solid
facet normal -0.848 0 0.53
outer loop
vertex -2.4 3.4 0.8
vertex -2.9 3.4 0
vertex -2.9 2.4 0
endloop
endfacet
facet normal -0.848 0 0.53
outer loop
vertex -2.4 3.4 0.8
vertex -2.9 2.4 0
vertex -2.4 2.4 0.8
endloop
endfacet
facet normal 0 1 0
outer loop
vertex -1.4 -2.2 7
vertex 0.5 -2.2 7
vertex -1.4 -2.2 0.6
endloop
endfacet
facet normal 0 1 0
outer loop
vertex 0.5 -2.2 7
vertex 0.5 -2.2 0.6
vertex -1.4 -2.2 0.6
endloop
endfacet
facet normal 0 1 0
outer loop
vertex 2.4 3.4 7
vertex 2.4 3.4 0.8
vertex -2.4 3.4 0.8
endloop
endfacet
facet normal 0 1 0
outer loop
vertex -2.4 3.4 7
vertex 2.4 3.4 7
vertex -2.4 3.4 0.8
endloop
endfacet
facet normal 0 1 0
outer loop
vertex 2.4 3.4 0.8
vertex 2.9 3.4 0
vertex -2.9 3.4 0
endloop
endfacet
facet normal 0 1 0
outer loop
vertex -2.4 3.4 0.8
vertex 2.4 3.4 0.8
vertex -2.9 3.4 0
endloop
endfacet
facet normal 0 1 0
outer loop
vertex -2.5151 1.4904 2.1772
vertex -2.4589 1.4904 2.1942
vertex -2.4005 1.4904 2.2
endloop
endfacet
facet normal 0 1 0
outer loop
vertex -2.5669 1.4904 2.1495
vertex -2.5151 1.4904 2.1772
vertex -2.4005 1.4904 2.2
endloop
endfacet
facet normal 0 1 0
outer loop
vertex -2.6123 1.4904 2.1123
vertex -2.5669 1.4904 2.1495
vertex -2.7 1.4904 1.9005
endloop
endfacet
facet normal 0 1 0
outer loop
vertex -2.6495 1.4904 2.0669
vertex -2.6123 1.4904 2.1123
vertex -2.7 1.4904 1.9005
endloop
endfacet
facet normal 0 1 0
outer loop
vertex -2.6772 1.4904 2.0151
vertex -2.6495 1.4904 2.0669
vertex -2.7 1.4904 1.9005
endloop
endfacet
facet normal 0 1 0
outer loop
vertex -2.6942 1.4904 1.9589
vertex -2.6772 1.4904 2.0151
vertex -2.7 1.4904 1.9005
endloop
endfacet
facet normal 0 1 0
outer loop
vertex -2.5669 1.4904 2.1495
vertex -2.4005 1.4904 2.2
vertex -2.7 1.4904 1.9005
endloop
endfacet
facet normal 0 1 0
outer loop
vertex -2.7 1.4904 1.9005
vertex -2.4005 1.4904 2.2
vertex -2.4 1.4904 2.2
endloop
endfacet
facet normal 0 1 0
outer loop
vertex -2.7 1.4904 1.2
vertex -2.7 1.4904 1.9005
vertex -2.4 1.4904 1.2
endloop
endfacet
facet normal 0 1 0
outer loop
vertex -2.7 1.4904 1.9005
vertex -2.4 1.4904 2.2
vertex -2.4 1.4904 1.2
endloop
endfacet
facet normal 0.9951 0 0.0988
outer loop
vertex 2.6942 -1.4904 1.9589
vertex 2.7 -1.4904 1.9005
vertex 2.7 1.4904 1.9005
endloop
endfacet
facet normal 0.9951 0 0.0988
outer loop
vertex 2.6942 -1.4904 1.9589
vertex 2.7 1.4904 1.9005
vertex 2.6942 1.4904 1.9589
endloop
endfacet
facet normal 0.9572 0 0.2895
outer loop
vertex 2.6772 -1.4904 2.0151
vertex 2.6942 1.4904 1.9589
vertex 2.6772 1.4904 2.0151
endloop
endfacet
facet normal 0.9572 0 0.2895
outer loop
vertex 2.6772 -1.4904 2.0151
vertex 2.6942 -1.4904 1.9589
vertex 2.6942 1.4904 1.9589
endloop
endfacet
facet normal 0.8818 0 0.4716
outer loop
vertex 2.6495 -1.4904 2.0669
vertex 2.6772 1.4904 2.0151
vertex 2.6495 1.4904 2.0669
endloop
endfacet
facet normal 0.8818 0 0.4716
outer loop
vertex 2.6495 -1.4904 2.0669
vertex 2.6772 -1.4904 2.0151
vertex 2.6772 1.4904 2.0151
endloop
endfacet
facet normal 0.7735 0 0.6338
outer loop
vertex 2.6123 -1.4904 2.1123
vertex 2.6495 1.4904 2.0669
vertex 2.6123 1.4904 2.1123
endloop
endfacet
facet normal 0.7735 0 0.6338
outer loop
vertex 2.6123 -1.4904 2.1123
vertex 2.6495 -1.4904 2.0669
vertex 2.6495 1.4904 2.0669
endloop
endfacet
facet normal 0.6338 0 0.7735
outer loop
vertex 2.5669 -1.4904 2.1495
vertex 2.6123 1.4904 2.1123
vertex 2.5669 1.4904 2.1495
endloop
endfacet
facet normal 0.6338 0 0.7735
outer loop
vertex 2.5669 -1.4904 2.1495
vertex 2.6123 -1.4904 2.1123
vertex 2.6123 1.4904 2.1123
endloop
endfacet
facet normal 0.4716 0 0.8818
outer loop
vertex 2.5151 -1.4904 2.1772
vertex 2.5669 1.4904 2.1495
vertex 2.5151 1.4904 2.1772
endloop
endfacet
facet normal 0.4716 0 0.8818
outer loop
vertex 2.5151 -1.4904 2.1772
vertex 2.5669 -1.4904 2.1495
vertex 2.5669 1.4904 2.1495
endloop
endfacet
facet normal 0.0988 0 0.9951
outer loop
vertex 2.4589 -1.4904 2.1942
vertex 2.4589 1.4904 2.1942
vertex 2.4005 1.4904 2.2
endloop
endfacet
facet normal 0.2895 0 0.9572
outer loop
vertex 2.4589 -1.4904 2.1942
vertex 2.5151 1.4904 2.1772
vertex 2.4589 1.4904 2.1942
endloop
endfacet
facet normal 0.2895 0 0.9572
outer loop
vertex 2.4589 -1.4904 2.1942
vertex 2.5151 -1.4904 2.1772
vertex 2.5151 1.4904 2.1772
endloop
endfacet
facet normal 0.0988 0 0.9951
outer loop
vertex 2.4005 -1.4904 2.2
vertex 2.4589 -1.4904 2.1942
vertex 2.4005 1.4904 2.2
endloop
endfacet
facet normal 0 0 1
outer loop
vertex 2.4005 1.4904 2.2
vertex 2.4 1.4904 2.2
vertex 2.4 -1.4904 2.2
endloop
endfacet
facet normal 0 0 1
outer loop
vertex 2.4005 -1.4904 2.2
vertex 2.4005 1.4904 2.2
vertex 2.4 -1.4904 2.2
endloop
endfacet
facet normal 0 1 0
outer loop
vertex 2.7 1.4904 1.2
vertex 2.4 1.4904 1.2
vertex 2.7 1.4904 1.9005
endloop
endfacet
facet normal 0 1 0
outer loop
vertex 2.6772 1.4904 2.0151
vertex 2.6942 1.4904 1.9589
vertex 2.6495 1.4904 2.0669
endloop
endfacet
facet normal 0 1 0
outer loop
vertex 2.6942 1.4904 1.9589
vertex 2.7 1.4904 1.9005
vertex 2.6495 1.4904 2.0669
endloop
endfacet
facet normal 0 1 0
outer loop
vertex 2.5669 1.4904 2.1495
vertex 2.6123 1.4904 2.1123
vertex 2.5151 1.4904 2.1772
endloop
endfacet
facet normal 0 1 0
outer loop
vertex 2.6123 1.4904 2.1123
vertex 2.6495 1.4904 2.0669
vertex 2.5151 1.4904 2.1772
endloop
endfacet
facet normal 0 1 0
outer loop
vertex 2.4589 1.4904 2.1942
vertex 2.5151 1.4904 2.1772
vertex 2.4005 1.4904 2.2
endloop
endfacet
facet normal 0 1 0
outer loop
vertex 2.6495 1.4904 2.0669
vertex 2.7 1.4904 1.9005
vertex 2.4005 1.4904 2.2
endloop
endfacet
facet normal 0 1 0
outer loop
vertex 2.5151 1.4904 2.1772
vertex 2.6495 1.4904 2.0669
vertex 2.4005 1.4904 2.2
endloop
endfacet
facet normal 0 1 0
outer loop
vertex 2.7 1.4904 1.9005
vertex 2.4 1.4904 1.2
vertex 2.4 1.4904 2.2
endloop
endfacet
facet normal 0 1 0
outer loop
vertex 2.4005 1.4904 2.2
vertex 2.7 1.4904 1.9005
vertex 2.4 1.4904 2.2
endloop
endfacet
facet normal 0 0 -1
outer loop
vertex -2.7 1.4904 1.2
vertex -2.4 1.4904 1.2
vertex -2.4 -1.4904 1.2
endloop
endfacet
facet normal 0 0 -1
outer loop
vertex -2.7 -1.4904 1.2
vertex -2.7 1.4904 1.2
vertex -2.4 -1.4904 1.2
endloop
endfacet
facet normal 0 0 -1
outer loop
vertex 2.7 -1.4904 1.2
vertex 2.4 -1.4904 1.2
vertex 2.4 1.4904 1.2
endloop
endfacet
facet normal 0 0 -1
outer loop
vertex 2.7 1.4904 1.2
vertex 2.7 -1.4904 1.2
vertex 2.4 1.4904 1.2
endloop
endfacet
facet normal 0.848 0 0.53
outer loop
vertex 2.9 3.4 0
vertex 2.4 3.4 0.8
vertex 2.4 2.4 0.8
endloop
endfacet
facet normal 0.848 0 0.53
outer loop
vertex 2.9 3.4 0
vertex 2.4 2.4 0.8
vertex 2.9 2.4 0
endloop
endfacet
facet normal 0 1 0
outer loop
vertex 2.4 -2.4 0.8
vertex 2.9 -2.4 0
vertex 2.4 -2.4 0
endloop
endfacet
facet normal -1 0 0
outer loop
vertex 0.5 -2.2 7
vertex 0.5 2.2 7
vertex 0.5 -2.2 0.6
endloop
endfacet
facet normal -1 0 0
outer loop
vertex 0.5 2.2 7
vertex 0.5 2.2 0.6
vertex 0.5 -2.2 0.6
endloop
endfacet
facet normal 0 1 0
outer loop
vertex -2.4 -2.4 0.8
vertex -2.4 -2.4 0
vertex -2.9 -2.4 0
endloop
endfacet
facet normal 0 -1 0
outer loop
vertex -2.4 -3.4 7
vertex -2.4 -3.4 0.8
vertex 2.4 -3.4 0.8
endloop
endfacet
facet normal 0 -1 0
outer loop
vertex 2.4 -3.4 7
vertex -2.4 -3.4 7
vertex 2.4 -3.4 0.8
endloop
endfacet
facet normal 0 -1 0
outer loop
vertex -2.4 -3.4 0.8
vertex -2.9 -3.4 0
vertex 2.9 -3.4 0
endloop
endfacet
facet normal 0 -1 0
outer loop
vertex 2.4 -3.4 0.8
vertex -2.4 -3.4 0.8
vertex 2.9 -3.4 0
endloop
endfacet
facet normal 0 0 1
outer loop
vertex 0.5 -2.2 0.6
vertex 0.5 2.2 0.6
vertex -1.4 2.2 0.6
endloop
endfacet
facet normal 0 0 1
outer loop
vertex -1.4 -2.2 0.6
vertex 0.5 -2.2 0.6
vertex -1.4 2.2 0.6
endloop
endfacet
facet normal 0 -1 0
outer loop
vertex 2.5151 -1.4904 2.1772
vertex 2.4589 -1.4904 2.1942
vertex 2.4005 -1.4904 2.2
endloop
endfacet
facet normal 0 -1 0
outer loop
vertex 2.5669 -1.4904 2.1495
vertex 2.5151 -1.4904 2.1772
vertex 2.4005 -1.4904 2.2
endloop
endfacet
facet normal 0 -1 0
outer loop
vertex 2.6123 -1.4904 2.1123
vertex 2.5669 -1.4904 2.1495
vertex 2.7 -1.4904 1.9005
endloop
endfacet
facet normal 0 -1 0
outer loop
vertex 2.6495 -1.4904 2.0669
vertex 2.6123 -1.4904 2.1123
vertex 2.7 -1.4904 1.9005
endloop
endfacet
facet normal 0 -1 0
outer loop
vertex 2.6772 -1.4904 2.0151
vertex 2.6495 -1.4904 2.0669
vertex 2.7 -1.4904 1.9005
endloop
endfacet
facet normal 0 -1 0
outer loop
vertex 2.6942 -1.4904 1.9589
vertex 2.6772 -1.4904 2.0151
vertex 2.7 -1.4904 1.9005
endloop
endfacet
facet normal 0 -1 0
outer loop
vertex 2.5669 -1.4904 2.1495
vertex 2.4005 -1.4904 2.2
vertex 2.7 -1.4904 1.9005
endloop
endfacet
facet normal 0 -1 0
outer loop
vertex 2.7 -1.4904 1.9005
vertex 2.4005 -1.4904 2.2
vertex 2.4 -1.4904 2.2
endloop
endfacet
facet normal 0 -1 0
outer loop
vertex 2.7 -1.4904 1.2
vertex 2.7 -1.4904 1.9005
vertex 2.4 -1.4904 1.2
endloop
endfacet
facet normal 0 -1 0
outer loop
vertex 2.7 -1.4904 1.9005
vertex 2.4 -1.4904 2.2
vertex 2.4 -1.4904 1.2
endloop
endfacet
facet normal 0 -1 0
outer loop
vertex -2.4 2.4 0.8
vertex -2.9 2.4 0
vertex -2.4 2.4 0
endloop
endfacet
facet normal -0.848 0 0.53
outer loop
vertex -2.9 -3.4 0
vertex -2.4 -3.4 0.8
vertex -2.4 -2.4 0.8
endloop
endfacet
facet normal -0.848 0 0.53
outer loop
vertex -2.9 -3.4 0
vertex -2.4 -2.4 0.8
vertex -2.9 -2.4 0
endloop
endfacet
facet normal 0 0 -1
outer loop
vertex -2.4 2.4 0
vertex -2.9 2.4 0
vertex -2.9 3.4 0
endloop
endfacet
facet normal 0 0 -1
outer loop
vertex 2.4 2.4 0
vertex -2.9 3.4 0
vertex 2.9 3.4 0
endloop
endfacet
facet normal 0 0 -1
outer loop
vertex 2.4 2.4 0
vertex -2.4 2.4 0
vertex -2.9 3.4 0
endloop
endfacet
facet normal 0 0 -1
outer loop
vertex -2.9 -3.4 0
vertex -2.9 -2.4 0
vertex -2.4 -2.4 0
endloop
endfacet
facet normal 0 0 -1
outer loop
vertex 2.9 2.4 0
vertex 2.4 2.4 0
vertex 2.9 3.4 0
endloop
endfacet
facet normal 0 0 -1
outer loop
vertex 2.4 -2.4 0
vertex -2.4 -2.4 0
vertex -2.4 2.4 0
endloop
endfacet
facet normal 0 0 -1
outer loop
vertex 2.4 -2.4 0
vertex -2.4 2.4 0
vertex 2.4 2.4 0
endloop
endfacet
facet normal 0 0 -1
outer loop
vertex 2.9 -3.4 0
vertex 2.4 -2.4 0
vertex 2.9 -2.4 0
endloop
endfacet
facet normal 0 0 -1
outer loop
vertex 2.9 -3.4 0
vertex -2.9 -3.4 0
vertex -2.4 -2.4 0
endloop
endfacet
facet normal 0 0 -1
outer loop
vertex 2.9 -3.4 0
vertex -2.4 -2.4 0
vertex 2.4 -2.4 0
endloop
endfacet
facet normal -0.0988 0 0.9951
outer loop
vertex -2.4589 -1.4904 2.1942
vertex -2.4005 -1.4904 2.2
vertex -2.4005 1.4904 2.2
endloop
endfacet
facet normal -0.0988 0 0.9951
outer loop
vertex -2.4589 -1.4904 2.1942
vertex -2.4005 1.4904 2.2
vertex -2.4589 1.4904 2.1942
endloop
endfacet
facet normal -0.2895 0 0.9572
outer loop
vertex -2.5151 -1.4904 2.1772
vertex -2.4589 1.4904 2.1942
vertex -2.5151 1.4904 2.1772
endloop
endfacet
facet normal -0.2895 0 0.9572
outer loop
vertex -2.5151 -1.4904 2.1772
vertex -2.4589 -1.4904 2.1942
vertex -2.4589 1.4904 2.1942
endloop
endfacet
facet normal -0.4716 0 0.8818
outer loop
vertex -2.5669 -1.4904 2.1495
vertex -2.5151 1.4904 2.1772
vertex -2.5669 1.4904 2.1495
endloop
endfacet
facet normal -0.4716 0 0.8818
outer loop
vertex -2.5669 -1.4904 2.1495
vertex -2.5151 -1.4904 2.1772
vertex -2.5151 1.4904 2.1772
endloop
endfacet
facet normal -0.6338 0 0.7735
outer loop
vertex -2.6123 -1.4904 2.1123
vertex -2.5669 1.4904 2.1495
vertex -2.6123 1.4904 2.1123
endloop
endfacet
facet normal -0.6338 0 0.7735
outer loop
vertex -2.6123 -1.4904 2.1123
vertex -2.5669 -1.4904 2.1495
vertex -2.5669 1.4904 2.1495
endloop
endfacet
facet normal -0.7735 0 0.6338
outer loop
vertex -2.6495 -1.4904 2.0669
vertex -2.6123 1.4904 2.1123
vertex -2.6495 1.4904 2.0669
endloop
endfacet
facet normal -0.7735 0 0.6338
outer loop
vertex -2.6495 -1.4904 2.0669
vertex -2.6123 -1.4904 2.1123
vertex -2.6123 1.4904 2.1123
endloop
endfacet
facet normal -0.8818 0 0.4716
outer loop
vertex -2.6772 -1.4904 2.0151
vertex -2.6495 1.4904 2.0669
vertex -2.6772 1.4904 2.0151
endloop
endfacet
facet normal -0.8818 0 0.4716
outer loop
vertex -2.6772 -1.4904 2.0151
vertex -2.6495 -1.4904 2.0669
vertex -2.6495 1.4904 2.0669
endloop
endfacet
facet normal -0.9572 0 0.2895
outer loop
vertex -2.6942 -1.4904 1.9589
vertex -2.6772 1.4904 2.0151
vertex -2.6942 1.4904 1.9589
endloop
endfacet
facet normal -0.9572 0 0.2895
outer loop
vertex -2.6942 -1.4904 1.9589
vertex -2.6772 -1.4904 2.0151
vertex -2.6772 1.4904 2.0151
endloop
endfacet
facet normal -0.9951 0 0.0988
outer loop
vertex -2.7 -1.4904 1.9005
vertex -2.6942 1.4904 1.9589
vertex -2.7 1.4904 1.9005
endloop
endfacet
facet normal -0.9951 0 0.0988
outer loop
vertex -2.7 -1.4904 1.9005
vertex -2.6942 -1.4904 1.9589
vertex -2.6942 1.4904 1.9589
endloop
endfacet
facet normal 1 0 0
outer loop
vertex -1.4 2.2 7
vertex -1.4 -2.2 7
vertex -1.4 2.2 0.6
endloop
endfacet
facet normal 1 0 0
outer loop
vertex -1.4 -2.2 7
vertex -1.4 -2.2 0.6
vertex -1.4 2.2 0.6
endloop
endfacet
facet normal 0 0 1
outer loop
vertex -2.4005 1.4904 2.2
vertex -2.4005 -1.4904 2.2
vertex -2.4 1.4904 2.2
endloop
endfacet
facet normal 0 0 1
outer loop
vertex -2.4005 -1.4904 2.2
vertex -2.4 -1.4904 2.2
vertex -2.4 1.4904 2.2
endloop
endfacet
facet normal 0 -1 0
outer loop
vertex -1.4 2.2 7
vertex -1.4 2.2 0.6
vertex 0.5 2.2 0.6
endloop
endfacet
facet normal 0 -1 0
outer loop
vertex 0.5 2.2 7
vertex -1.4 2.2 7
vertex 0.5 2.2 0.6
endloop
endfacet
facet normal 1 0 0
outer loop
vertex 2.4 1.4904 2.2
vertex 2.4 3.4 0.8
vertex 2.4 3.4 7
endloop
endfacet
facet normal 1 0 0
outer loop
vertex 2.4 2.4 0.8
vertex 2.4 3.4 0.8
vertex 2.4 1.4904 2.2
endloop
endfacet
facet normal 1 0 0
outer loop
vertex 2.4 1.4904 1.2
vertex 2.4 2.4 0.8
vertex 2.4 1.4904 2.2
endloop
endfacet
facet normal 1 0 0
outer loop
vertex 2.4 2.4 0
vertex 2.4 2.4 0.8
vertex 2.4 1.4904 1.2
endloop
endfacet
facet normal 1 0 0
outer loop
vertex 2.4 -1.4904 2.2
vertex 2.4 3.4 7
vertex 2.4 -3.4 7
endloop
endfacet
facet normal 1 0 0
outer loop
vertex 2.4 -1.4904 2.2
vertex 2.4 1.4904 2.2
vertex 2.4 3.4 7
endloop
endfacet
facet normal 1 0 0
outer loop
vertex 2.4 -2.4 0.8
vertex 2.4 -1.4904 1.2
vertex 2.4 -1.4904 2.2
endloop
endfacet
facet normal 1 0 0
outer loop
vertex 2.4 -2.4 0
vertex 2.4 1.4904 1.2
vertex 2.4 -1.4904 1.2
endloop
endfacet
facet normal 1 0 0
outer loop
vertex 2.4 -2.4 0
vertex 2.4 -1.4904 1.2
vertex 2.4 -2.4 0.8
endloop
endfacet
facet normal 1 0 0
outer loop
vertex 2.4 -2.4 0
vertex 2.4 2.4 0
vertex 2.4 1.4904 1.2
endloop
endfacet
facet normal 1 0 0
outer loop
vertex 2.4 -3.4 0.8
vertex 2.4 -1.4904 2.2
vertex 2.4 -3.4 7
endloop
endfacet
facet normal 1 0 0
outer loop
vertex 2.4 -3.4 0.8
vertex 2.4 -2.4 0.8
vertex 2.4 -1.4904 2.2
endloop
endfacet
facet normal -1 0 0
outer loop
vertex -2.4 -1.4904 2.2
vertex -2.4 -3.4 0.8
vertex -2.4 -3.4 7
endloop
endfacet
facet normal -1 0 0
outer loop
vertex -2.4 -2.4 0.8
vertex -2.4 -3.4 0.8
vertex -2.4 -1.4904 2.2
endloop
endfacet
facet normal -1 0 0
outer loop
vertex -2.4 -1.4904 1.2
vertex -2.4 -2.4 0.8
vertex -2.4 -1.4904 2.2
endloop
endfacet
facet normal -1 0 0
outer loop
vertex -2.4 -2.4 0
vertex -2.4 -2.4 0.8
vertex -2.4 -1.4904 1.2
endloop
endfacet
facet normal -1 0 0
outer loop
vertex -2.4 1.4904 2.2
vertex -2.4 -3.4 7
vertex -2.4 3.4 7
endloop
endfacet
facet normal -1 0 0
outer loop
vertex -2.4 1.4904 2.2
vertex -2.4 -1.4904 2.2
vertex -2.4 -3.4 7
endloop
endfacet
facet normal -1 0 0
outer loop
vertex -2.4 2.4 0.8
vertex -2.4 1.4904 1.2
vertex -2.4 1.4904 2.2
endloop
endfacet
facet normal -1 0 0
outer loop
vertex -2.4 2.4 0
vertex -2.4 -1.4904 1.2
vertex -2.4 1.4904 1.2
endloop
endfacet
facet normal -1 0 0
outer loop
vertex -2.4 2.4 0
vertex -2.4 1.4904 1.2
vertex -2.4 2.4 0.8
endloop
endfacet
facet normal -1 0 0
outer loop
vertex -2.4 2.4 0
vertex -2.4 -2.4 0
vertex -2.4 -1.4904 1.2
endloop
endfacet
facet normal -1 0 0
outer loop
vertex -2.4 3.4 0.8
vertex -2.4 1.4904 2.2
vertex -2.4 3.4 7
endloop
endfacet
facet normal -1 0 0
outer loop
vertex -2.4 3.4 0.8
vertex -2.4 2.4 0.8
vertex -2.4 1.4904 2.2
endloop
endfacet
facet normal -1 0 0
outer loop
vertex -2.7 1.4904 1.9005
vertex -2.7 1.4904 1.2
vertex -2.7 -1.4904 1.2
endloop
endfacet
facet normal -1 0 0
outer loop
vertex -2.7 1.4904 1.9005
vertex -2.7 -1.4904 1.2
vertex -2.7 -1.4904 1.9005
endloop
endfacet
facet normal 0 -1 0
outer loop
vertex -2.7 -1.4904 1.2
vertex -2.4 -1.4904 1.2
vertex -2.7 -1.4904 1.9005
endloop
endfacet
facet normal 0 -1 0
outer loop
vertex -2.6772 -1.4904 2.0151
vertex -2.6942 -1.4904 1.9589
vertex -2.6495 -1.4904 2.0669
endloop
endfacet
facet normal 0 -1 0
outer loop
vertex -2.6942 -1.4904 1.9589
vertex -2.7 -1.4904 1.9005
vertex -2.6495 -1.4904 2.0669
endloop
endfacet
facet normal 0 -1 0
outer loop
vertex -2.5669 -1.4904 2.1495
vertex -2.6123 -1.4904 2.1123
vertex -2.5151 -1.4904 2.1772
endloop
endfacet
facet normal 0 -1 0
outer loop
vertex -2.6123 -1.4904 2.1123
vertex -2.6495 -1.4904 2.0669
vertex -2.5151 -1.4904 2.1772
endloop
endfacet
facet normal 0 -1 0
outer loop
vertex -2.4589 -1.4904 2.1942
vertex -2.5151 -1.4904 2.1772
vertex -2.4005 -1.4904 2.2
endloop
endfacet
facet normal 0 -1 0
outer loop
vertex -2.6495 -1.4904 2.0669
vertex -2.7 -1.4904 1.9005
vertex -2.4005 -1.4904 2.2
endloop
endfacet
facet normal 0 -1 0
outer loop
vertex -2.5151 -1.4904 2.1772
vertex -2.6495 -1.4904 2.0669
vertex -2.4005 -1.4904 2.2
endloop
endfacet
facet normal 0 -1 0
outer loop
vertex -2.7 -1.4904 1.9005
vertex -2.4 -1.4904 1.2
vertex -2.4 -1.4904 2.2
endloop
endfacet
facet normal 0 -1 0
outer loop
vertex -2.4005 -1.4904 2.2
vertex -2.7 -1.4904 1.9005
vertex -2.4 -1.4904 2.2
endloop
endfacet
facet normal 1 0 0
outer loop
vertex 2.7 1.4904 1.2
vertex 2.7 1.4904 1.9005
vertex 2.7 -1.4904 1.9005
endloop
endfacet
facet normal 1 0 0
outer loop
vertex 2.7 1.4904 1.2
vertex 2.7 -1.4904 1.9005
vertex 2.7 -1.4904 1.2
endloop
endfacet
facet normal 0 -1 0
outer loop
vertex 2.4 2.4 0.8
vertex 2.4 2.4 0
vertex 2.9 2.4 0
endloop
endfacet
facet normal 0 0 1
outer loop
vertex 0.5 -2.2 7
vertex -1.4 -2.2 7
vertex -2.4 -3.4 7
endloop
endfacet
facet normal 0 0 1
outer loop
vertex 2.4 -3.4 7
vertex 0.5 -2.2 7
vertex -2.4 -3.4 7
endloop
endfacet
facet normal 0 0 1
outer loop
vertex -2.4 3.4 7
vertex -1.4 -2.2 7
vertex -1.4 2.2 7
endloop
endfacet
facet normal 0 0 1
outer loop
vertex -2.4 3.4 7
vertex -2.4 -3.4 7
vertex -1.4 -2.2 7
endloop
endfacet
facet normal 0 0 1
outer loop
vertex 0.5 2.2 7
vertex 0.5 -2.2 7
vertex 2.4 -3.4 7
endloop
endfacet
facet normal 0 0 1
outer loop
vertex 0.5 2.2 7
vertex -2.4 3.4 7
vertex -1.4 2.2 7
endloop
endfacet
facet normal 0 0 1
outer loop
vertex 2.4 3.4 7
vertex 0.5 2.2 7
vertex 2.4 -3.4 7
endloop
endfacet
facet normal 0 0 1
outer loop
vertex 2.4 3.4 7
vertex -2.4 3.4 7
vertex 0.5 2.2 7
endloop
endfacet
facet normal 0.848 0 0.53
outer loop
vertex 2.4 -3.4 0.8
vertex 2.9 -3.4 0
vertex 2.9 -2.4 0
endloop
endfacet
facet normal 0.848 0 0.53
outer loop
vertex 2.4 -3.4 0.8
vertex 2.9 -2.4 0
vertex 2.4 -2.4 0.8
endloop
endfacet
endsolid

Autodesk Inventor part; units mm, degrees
ref_plane "YZ Plane" through (0, 0, 0) normal (1, 0, 0) x (0, 1, 0)
ref_plane "XZ Plane" through (0, 0, 0) normal (0, 1, 0) x (-1, 0, 0)
ref_plane "XY Plane" through (0, 0, 0) normal (0, 0, 1) x (1, 0, 0)
sketch "Boceto1" plane through (0, 0, 0) normal (0, 0, 1) x (1, 0, 0)
  line L0 (-2.4, 3.4) -> (2.4, 3.4)
  line L1 (2.4, 3.4) -> (2.4, -3.4)
  line L2 (2.4, -3.4) -> (-2.4, -3.4)
  line L3 (-2.4, -3.4) -> (-2.4, 3.4)
  line L4 (0, -4.76) -> (0, 4.76) projected
  line L5 (-3.36, 0) -> (3.36, 0) projected
  line L6 (-1.4, 2.2) -> (0.5, 2.2)
  line L7 (0.5, 2.2) -> (0.5, -2.2)
  line L8 (0.5, -2.2) -> (-1.4, -2.2)
  line L9 (-1.4, -2.2) -> (-1.4, 2.2)
  dimension "d0" = 4.8
  dimension "d1" = 6.8
  dimension "d19" = 1.9
  dimension "d20" = 4.4
  dimension "d21" = 1
extrude "Extrusión1" add sketch "Boceto1" along normal blind 7 contours L0 L4 L6 L9 L5 L3 | L0 L1 L5 L7 L6 L4 | L5 L9 L8 L4 L2 L3 | L1 L2 L4 L8 L7 L5
sketch "Boceto2" plane through (2.4, -3.4, 0) normal (1, 0, 0) x (0, 0, -1)
  line L0 (-1.2, 4.8904) -> (-2.2, 4.8904)
  line L1 (-2.2, 4.8904) -> (-2.2, 1.9096)
  line L2 (-2.2, 1.9096) -> (-1.2, 1.9096)
  line L3 (-1.2, 1.9096) -> (-1.2, 4.8904)
  line L4 (1.4, 3.4) -> (-8.4, 3.4) projected
  line L5 (0, 0) -> (0, 6.8) projected
  point P0 (0, 3.4)
  dimension "d8" = 1.2
  dimension "d9" = 1
extrude "Extrusión2" add sketch "Boceto2" along normal blind 0.3
sketch "Boceto3" plane through (-2.4, 3.4, 0) normal (0, 1, 0) x (1, 0, 0)
  line L0 (4.8, 0) -> (0, 0) projected
  line L1 (4.8, 0) -> (4.8, -0.8)
  line L2 (4.8, 0) -> (4.8, -7) projected
  line L3 (4.8, -0.8) -> (5.3, 0)
  line L4 (5.3, 0) -> (4.8, 0)
  point P0 (2.4, 0)
  dimension "d12" = 0.8
  dimension "d22" = 0.5
extrude "Extrusión3" add sketch "Boceto3" against normal blind 1
fillet "Empalme1" radius 0.3 1 edges at (2.7, 0, 2.2)
mirror "Simetría1" about plane through (0, 0, 0) normal (1, 0, 0) of "Extrusión2", "Empalme1"
mirror "Simetría2" about plane through (0, 0, 0) normal (1, 0, 0) of "Extrusión3"
mirror "Simetría3" about plane through (0, 0, 0) normal (0, 1, 0) of "Extrusión3", "Simetría2"
sketch "Boceto4" plane through (0, 0, 0) normal (0, 0, -1) x (-1, 0, 0)
  line L0 (-2.9, 3.4) -> (2.9, 3.4) projected
  line L1 (-2.9, 3.4) -> (-2.9, 2.4) projected
  line L2 (-2.4, 2.4) -> (-2.9, 2.4) projected
  line L3 (-2.4, -2.4) -> (-2.4, 2.4) projected
  line L4 (-2.4, -2.4) -> (-2.9, -2.4) projected
  line L5 (-2.9, -3.4) -> (-2.9, -2.4) projected
  line L6 (2.9, -3.4) -> (-2.9, -3.4) projected
  line L7 (2.9, -3.4) -> (2.9, -2.4) projected
  line L8 (2.4, -2.4) -> (2.9, -2.4) projected
  line L9 (2.4, 2.4) -> (2.4, -2.4) projected
  line L10 (2.4, 2.4) -> (2.9, 2.4) projected
  line L11 (2.9, 3.4) -> (2.9, 2.4) projected
  line L12 (2.4, -3.4) -> (-2.4, -3.4) projected
  line L13 (-2.4, -3.4) -> (-2.4, 3.4) projected
  line L14 (2.4, -3.4) -> (-2.4, -3.4)
  line L15 (-2.4, -3.4) -> (-2.4, 3.4)
  line L16 (-2.4, 3.4) -> (2.4, 3.4)
  line L17 (2.4, 3.4) -> (2.4, -3.4)
  point P0 (0, 0)
extrude "Extrusión4" add sketch "Boceto4" against normal blind 0.6 contours L0 L17 L9 L6 L13 L3
properties part number "Porta Hall Sensor"
